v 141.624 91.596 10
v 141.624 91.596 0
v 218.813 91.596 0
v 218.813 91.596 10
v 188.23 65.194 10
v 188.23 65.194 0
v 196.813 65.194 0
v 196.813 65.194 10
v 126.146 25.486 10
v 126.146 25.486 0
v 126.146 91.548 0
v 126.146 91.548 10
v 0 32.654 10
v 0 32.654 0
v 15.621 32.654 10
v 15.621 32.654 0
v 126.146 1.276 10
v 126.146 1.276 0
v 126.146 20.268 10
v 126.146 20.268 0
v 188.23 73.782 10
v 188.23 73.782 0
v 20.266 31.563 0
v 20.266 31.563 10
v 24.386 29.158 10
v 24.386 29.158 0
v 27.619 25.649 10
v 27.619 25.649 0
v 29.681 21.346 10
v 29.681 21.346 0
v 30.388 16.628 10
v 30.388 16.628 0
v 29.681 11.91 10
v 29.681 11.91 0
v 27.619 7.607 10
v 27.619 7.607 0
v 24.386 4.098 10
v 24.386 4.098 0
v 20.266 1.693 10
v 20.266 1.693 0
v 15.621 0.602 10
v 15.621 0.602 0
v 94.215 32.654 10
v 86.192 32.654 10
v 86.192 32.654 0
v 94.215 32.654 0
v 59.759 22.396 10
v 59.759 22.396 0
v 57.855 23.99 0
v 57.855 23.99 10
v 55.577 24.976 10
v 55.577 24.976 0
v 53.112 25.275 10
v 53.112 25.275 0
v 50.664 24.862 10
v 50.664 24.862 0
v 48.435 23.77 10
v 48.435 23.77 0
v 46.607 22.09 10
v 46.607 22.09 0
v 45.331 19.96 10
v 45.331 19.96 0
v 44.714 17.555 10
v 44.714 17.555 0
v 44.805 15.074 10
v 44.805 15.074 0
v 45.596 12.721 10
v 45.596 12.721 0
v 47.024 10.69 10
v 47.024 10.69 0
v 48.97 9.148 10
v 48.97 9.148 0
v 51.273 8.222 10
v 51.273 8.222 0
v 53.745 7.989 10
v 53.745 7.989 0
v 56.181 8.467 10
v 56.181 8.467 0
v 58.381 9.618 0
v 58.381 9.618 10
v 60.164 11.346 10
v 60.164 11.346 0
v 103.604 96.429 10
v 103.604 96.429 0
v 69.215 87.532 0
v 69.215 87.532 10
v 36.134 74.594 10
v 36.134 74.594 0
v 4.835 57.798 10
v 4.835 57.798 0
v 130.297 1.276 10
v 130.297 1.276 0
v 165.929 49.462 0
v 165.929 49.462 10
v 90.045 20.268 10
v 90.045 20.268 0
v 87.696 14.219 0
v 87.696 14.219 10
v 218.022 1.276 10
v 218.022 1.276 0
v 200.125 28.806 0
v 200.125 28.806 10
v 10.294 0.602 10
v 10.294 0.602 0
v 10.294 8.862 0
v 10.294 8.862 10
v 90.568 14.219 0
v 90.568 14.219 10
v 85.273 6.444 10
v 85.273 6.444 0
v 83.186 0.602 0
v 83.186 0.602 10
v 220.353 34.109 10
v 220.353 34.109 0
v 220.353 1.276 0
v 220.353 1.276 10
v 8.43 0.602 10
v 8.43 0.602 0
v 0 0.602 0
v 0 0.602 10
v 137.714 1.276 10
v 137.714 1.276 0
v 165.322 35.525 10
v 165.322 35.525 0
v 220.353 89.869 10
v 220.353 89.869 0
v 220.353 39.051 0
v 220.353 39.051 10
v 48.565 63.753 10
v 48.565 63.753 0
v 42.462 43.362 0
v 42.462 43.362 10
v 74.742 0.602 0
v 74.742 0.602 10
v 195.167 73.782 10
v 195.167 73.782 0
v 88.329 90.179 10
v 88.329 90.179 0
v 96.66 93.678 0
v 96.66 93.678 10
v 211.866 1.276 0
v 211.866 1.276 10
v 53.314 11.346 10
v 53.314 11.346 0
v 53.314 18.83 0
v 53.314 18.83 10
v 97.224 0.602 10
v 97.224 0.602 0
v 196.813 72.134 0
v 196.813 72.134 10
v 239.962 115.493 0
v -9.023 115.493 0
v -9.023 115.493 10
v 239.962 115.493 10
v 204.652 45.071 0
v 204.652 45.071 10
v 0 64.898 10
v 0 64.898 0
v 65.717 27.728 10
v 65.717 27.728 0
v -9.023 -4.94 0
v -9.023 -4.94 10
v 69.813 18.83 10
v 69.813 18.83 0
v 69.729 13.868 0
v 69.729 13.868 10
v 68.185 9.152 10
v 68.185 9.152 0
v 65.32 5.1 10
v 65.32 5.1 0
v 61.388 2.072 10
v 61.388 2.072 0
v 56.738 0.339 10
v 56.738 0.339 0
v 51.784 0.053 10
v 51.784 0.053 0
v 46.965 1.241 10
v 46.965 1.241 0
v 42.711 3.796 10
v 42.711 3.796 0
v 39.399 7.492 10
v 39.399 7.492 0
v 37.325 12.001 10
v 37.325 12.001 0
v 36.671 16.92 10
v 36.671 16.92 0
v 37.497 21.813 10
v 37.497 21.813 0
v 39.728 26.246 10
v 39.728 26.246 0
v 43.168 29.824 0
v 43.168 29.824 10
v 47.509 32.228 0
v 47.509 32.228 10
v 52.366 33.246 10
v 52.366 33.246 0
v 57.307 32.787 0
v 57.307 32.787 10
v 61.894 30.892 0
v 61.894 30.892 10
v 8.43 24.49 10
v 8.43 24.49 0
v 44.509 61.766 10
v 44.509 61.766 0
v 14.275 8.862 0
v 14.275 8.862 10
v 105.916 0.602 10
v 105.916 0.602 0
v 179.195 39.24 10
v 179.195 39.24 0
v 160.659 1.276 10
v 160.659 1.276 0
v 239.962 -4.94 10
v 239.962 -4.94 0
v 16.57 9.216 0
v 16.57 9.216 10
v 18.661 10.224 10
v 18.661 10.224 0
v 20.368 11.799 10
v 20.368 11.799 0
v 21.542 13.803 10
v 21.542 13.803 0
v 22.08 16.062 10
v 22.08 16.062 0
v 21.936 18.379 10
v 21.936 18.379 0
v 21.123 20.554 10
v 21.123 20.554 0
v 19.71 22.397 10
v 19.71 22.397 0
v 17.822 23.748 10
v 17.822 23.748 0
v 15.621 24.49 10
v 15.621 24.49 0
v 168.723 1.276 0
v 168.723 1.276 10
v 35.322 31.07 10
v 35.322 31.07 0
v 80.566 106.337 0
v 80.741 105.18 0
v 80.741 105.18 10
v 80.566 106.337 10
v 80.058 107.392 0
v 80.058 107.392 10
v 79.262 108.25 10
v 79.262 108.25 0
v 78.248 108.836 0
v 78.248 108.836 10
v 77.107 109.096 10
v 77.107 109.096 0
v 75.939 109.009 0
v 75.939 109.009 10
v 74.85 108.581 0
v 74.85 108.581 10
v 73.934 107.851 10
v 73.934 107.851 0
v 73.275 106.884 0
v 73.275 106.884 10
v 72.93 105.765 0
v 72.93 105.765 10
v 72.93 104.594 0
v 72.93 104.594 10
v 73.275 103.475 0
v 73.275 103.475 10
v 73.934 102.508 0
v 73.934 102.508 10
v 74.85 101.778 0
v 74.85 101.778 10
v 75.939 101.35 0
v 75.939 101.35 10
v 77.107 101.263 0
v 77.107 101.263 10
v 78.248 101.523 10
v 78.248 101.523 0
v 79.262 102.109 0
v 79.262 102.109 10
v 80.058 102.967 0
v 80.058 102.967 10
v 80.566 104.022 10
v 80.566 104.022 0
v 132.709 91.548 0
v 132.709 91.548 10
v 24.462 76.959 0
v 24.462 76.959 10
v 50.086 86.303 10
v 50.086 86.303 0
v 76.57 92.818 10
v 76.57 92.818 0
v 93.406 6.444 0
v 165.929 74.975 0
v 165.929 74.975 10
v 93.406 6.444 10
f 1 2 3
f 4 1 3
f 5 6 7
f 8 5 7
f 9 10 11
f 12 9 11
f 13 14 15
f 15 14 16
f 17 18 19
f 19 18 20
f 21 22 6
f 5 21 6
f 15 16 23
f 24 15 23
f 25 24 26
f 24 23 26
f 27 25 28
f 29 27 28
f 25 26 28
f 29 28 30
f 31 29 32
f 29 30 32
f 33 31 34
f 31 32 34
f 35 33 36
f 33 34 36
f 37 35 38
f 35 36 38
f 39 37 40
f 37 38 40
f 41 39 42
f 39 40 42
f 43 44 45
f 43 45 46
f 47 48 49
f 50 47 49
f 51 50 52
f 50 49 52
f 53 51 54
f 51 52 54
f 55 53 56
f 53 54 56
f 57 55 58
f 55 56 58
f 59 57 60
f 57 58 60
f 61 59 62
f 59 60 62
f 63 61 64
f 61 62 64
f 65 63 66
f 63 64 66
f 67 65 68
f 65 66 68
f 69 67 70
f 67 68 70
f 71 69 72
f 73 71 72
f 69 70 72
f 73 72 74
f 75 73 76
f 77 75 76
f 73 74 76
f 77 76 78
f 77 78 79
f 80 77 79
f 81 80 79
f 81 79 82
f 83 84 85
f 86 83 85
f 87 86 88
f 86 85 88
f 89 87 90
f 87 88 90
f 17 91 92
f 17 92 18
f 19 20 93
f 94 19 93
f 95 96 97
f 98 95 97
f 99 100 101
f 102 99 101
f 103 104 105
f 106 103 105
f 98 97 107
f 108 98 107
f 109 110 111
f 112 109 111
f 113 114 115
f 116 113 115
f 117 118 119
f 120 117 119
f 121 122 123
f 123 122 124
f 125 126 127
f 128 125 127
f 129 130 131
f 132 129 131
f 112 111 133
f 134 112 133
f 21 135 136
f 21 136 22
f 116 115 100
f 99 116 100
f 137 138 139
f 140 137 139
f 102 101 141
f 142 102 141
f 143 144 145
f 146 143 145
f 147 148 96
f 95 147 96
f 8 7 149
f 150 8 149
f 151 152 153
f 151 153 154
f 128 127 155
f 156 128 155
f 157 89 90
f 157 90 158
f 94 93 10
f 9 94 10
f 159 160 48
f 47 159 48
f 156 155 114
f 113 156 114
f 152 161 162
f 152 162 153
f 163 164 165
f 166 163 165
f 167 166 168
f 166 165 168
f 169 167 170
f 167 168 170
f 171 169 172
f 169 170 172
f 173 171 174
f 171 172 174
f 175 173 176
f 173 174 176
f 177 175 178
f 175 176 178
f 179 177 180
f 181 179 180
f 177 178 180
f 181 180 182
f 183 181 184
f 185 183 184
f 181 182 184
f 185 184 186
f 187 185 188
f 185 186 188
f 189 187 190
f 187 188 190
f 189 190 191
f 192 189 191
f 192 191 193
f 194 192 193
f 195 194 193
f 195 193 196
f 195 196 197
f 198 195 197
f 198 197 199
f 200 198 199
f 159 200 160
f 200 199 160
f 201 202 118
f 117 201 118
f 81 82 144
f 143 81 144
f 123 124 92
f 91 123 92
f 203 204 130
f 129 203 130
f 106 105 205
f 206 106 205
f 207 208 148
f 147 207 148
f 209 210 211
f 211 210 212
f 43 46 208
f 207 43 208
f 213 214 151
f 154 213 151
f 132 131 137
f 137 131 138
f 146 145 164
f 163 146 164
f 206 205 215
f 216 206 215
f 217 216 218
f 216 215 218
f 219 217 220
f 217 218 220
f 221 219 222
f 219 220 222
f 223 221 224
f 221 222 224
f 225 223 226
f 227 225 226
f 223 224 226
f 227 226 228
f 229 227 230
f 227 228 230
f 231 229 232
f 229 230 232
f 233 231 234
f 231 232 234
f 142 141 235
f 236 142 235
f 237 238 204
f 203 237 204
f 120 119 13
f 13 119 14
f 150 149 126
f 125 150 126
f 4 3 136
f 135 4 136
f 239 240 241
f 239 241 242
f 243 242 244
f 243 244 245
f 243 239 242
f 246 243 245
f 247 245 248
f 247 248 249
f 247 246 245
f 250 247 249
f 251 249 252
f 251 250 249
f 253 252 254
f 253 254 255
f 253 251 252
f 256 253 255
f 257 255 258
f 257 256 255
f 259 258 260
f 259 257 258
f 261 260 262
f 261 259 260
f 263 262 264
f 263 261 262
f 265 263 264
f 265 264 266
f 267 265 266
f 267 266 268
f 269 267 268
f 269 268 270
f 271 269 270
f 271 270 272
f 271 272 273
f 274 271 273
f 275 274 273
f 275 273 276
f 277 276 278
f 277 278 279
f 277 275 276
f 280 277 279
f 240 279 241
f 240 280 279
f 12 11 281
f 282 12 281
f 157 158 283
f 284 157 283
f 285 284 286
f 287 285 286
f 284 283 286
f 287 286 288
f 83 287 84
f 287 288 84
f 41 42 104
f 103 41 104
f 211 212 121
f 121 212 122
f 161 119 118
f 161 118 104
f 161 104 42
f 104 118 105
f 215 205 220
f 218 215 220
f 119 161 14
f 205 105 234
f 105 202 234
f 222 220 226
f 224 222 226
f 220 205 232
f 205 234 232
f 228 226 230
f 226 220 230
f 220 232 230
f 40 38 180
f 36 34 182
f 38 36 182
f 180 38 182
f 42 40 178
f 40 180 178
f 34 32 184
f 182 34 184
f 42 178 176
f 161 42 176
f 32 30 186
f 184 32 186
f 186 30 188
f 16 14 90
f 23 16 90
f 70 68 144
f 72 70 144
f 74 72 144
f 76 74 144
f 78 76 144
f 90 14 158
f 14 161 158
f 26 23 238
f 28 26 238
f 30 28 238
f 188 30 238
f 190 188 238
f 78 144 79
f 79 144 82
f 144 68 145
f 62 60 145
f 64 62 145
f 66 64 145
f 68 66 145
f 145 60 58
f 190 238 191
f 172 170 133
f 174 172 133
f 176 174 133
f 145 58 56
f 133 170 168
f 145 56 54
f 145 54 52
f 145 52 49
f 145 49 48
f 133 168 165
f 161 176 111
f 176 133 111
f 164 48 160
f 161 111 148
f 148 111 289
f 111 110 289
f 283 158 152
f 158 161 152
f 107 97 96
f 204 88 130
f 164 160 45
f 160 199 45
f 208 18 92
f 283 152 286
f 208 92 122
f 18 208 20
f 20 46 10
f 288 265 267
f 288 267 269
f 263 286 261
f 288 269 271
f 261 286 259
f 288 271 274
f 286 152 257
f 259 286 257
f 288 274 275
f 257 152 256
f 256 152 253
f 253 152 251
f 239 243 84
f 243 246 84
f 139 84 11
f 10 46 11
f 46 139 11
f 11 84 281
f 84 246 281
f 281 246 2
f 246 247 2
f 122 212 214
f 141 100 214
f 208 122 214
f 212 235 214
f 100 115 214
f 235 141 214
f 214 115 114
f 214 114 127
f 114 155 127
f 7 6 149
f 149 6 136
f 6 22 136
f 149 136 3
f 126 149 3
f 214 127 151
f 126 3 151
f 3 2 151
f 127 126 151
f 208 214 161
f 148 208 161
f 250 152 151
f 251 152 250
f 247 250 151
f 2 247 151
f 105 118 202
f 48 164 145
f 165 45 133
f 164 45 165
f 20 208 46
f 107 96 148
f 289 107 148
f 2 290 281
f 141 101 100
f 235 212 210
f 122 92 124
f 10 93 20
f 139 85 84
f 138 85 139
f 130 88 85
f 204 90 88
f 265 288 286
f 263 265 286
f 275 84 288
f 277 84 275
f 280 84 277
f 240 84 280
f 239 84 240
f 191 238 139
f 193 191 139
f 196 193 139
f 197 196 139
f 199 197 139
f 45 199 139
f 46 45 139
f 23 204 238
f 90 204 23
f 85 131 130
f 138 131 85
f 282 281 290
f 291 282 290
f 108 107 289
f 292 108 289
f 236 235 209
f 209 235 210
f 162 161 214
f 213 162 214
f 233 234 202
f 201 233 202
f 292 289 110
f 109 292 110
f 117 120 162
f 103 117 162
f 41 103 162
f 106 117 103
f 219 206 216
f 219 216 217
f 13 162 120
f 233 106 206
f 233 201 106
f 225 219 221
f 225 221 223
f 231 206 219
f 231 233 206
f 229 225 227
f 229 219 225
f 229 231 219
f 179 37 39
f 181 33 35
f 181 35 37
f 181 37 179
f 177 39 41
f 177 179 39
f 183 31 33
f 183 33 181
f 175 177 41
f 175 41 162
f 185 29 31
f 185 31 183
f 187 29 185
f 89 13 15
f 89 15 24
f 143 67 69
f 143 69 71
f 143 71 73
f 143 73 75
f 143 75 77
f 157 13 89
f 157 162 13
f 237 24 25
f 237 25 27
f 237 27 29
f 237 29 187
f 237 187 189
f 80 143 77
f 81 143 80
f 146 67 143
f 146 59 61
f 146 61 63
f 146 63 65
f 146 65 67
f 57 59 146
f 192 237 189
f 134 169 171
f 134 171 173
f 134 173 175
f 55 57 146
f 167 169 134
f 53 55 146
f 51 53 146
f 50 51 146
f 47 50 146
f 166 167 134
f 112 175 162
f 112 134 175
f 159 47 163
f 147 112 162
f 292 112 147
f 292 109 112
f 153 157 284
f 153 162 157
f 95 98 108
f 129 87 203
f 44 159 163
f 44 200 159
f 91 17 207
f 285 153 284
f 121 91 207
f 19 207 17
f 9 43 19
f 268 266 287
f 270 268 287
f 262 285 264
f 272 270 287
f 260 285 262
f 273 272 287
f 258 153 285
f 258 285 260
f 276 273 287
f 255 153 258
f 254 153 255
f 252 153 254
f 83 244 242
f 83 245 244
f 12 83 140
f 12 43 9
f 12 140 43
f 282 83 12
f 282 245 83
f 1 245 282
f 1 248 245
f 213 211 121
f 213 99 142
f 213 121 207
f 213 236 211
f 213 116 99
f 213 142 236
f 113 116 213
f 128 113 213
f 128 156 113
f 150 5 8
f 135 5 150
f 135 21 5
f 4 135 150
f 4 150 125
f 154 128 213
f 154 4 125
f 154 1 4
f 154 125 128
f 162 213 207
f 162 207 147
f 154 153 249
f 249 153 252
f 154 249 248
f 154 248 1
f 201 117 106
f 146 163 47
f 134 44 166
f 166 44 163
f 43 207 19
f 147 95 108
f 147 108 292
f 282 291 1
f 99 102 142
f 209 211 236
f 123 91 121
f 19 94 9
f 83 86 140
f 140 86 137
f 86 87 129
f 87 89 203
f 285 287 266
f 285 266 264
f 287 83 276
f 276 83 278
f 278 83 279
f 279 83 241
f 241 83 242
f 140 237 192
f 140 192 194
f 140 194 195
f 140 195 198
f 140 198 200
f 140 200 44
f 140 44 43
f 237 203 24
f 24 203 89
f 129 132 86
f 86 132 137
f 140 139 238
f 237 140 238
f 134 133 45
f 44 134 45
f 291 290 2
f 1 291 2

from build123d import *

# Parameters (mm, degrees)
SKETCH1_W           = 248.984951577
SKETCH1_H           = 120.432938534
SKETCH1_R           = 3.927622284
BOSS_EXTRUDE1_DEPTH = 10


with BuildPart() as part:
    # Sketch1 → Boss-Extrude1 (new body)
    with BuildSketch(Plane.XY):
        with Locations((115.469095844, 55.276599595)):
            Rectangle(SKETCH1_W, SKETCH1_H)
        with BuildLine():
            Line((0, 32.653955718), (15.621240173, 32.653955718))
            ThreePointArc((15.621240173, 32.653955718), (30.388379433, 16.62799554), (15.621240173, 0.602035363))
            Line((15.621240173, 0.602035363), (10.293959075, 0.602035363))
            Line((10.293959075, 0.602035363), (10.293959075, 8.861852454))
            Line((10.293959075, 8.861852454), (14.274680474, 8.861852454))
            ThreePointArc((14.274680474, 8.861852454), (22.080061465, 16.061509913), (15.621240173, 24.490191155))
            Line((15.621240173, 24.490191155), (8.429804398, 24.490191155))
            Line((8.429804398, 24.490191155), (8.429804398, 0.602035363))
            Line((8.429804398, 0.602035363), (0, 0.602035363))
            Line((0, 0.602035363), (0, 32.653955718))
        make_face(mode=Mode.SUBTRACT)
        with BuildLine():
            Line((53.313679211, 11.346247394), (53.313679211, 18.830088837))
            Line((53.313679211, 18.830088837), (69.812648012, 18.830088837))
            ThreePointArc((69.812648012, 18.830088837), (38.193038875, 9.668726743), (65.717255622, 27.728287366))
            Line((65.717255622, 27.728287366), (59.75927661, 22.396332813))
            ThreePointArc((59.75927661, 22.396332813), (44.669643003, 16.311643284), (60.163684849, 11.346247394))
            Line((60.163684849, 11.346247394), (53.313679211, 11.346247394))
        make_face(mode=Mode.SUBTRACT)
        Polygon((83.185651108, 0.602035363), (74.742166319, 0.602035363), (86.191958884, 32.653955718), (94.215171192, 32.653955718), (105.915689142, 0.602035363), (97.223875808, 0.602035363), (90.044966021, 20.267647237), (87.696137012, 14.219111042), (90.567743799, 14.219111042), (93.405960474, 6.444216356), (85.272632474, 6.444216356), align=None, mode=Mode.SUBTRACT)
        Polygon((165.929478775, 74.975053885), (141.623819181, 91.5963268), (218.812994732, 91.5963268), (195.166908856, 73.782247188), (188.229793622, 73.782247188), (188.229793622, 65.193610278), (196.812613934, 65.193610278), (196.812613934, 72.134215516), (220.35325448, 89.868856548), (220.35325448, 39.050837541), (204.652216255, 45.070871149), (220.35325448, 34.108892188), (220.35325448, 1.27565402), (218.022003488, 1.27565402), (200.124503338, 28.805885142), (211.866175411, 1.27565402), (168.723408334, 1.27565402), (179.195250301, 39.239610221), (160.65924824, 1.27565402), (137.714117569, 1.27565402), (165.322421142, 35.525080037), (130.296961385, 1.27565402), (126.146157188, 1.27565402), (126.146157188, 20.267647237), (165.929478775, 49.461736063), (126.146157188, 25.486362594), (126.146157188, 91.54755974), (132.709440168, 91.54755974), align=None, mode=Mode.SUBTRACT)
        with BuildLine():
            Line((4.834579987, 57.798227986), (0, 64.897937367))
            ThreePointArc((0, 64.897937367), (50.085795072, 86.302645706), (103.604066377, 96.428999618))
            ThreePointArc((103.604066377, 96.428999618), (52.480961252, 81.558182411), (4.834579987, 57.798227986))
        make_face(mode=Mode.SUBTRACT)
        Polygon((35.321567329, 31.069910316), (44.509426528, 61.76571264), (48.564924823, 63.753147229), (42.461506674, 43.362182051), (88.328778824, 90.179245039), (96.659761905, 93.678257933), align=None, mode=Mode.SUBTRACT)
        with Locations((76.813345198, 105.179515455)):
            Circle(SKETCH1_R, mode=Mode.SUBTRACT)
    extrude(amount=BOSS_EXTRUDE1_DEPTH)


solid = part.part
